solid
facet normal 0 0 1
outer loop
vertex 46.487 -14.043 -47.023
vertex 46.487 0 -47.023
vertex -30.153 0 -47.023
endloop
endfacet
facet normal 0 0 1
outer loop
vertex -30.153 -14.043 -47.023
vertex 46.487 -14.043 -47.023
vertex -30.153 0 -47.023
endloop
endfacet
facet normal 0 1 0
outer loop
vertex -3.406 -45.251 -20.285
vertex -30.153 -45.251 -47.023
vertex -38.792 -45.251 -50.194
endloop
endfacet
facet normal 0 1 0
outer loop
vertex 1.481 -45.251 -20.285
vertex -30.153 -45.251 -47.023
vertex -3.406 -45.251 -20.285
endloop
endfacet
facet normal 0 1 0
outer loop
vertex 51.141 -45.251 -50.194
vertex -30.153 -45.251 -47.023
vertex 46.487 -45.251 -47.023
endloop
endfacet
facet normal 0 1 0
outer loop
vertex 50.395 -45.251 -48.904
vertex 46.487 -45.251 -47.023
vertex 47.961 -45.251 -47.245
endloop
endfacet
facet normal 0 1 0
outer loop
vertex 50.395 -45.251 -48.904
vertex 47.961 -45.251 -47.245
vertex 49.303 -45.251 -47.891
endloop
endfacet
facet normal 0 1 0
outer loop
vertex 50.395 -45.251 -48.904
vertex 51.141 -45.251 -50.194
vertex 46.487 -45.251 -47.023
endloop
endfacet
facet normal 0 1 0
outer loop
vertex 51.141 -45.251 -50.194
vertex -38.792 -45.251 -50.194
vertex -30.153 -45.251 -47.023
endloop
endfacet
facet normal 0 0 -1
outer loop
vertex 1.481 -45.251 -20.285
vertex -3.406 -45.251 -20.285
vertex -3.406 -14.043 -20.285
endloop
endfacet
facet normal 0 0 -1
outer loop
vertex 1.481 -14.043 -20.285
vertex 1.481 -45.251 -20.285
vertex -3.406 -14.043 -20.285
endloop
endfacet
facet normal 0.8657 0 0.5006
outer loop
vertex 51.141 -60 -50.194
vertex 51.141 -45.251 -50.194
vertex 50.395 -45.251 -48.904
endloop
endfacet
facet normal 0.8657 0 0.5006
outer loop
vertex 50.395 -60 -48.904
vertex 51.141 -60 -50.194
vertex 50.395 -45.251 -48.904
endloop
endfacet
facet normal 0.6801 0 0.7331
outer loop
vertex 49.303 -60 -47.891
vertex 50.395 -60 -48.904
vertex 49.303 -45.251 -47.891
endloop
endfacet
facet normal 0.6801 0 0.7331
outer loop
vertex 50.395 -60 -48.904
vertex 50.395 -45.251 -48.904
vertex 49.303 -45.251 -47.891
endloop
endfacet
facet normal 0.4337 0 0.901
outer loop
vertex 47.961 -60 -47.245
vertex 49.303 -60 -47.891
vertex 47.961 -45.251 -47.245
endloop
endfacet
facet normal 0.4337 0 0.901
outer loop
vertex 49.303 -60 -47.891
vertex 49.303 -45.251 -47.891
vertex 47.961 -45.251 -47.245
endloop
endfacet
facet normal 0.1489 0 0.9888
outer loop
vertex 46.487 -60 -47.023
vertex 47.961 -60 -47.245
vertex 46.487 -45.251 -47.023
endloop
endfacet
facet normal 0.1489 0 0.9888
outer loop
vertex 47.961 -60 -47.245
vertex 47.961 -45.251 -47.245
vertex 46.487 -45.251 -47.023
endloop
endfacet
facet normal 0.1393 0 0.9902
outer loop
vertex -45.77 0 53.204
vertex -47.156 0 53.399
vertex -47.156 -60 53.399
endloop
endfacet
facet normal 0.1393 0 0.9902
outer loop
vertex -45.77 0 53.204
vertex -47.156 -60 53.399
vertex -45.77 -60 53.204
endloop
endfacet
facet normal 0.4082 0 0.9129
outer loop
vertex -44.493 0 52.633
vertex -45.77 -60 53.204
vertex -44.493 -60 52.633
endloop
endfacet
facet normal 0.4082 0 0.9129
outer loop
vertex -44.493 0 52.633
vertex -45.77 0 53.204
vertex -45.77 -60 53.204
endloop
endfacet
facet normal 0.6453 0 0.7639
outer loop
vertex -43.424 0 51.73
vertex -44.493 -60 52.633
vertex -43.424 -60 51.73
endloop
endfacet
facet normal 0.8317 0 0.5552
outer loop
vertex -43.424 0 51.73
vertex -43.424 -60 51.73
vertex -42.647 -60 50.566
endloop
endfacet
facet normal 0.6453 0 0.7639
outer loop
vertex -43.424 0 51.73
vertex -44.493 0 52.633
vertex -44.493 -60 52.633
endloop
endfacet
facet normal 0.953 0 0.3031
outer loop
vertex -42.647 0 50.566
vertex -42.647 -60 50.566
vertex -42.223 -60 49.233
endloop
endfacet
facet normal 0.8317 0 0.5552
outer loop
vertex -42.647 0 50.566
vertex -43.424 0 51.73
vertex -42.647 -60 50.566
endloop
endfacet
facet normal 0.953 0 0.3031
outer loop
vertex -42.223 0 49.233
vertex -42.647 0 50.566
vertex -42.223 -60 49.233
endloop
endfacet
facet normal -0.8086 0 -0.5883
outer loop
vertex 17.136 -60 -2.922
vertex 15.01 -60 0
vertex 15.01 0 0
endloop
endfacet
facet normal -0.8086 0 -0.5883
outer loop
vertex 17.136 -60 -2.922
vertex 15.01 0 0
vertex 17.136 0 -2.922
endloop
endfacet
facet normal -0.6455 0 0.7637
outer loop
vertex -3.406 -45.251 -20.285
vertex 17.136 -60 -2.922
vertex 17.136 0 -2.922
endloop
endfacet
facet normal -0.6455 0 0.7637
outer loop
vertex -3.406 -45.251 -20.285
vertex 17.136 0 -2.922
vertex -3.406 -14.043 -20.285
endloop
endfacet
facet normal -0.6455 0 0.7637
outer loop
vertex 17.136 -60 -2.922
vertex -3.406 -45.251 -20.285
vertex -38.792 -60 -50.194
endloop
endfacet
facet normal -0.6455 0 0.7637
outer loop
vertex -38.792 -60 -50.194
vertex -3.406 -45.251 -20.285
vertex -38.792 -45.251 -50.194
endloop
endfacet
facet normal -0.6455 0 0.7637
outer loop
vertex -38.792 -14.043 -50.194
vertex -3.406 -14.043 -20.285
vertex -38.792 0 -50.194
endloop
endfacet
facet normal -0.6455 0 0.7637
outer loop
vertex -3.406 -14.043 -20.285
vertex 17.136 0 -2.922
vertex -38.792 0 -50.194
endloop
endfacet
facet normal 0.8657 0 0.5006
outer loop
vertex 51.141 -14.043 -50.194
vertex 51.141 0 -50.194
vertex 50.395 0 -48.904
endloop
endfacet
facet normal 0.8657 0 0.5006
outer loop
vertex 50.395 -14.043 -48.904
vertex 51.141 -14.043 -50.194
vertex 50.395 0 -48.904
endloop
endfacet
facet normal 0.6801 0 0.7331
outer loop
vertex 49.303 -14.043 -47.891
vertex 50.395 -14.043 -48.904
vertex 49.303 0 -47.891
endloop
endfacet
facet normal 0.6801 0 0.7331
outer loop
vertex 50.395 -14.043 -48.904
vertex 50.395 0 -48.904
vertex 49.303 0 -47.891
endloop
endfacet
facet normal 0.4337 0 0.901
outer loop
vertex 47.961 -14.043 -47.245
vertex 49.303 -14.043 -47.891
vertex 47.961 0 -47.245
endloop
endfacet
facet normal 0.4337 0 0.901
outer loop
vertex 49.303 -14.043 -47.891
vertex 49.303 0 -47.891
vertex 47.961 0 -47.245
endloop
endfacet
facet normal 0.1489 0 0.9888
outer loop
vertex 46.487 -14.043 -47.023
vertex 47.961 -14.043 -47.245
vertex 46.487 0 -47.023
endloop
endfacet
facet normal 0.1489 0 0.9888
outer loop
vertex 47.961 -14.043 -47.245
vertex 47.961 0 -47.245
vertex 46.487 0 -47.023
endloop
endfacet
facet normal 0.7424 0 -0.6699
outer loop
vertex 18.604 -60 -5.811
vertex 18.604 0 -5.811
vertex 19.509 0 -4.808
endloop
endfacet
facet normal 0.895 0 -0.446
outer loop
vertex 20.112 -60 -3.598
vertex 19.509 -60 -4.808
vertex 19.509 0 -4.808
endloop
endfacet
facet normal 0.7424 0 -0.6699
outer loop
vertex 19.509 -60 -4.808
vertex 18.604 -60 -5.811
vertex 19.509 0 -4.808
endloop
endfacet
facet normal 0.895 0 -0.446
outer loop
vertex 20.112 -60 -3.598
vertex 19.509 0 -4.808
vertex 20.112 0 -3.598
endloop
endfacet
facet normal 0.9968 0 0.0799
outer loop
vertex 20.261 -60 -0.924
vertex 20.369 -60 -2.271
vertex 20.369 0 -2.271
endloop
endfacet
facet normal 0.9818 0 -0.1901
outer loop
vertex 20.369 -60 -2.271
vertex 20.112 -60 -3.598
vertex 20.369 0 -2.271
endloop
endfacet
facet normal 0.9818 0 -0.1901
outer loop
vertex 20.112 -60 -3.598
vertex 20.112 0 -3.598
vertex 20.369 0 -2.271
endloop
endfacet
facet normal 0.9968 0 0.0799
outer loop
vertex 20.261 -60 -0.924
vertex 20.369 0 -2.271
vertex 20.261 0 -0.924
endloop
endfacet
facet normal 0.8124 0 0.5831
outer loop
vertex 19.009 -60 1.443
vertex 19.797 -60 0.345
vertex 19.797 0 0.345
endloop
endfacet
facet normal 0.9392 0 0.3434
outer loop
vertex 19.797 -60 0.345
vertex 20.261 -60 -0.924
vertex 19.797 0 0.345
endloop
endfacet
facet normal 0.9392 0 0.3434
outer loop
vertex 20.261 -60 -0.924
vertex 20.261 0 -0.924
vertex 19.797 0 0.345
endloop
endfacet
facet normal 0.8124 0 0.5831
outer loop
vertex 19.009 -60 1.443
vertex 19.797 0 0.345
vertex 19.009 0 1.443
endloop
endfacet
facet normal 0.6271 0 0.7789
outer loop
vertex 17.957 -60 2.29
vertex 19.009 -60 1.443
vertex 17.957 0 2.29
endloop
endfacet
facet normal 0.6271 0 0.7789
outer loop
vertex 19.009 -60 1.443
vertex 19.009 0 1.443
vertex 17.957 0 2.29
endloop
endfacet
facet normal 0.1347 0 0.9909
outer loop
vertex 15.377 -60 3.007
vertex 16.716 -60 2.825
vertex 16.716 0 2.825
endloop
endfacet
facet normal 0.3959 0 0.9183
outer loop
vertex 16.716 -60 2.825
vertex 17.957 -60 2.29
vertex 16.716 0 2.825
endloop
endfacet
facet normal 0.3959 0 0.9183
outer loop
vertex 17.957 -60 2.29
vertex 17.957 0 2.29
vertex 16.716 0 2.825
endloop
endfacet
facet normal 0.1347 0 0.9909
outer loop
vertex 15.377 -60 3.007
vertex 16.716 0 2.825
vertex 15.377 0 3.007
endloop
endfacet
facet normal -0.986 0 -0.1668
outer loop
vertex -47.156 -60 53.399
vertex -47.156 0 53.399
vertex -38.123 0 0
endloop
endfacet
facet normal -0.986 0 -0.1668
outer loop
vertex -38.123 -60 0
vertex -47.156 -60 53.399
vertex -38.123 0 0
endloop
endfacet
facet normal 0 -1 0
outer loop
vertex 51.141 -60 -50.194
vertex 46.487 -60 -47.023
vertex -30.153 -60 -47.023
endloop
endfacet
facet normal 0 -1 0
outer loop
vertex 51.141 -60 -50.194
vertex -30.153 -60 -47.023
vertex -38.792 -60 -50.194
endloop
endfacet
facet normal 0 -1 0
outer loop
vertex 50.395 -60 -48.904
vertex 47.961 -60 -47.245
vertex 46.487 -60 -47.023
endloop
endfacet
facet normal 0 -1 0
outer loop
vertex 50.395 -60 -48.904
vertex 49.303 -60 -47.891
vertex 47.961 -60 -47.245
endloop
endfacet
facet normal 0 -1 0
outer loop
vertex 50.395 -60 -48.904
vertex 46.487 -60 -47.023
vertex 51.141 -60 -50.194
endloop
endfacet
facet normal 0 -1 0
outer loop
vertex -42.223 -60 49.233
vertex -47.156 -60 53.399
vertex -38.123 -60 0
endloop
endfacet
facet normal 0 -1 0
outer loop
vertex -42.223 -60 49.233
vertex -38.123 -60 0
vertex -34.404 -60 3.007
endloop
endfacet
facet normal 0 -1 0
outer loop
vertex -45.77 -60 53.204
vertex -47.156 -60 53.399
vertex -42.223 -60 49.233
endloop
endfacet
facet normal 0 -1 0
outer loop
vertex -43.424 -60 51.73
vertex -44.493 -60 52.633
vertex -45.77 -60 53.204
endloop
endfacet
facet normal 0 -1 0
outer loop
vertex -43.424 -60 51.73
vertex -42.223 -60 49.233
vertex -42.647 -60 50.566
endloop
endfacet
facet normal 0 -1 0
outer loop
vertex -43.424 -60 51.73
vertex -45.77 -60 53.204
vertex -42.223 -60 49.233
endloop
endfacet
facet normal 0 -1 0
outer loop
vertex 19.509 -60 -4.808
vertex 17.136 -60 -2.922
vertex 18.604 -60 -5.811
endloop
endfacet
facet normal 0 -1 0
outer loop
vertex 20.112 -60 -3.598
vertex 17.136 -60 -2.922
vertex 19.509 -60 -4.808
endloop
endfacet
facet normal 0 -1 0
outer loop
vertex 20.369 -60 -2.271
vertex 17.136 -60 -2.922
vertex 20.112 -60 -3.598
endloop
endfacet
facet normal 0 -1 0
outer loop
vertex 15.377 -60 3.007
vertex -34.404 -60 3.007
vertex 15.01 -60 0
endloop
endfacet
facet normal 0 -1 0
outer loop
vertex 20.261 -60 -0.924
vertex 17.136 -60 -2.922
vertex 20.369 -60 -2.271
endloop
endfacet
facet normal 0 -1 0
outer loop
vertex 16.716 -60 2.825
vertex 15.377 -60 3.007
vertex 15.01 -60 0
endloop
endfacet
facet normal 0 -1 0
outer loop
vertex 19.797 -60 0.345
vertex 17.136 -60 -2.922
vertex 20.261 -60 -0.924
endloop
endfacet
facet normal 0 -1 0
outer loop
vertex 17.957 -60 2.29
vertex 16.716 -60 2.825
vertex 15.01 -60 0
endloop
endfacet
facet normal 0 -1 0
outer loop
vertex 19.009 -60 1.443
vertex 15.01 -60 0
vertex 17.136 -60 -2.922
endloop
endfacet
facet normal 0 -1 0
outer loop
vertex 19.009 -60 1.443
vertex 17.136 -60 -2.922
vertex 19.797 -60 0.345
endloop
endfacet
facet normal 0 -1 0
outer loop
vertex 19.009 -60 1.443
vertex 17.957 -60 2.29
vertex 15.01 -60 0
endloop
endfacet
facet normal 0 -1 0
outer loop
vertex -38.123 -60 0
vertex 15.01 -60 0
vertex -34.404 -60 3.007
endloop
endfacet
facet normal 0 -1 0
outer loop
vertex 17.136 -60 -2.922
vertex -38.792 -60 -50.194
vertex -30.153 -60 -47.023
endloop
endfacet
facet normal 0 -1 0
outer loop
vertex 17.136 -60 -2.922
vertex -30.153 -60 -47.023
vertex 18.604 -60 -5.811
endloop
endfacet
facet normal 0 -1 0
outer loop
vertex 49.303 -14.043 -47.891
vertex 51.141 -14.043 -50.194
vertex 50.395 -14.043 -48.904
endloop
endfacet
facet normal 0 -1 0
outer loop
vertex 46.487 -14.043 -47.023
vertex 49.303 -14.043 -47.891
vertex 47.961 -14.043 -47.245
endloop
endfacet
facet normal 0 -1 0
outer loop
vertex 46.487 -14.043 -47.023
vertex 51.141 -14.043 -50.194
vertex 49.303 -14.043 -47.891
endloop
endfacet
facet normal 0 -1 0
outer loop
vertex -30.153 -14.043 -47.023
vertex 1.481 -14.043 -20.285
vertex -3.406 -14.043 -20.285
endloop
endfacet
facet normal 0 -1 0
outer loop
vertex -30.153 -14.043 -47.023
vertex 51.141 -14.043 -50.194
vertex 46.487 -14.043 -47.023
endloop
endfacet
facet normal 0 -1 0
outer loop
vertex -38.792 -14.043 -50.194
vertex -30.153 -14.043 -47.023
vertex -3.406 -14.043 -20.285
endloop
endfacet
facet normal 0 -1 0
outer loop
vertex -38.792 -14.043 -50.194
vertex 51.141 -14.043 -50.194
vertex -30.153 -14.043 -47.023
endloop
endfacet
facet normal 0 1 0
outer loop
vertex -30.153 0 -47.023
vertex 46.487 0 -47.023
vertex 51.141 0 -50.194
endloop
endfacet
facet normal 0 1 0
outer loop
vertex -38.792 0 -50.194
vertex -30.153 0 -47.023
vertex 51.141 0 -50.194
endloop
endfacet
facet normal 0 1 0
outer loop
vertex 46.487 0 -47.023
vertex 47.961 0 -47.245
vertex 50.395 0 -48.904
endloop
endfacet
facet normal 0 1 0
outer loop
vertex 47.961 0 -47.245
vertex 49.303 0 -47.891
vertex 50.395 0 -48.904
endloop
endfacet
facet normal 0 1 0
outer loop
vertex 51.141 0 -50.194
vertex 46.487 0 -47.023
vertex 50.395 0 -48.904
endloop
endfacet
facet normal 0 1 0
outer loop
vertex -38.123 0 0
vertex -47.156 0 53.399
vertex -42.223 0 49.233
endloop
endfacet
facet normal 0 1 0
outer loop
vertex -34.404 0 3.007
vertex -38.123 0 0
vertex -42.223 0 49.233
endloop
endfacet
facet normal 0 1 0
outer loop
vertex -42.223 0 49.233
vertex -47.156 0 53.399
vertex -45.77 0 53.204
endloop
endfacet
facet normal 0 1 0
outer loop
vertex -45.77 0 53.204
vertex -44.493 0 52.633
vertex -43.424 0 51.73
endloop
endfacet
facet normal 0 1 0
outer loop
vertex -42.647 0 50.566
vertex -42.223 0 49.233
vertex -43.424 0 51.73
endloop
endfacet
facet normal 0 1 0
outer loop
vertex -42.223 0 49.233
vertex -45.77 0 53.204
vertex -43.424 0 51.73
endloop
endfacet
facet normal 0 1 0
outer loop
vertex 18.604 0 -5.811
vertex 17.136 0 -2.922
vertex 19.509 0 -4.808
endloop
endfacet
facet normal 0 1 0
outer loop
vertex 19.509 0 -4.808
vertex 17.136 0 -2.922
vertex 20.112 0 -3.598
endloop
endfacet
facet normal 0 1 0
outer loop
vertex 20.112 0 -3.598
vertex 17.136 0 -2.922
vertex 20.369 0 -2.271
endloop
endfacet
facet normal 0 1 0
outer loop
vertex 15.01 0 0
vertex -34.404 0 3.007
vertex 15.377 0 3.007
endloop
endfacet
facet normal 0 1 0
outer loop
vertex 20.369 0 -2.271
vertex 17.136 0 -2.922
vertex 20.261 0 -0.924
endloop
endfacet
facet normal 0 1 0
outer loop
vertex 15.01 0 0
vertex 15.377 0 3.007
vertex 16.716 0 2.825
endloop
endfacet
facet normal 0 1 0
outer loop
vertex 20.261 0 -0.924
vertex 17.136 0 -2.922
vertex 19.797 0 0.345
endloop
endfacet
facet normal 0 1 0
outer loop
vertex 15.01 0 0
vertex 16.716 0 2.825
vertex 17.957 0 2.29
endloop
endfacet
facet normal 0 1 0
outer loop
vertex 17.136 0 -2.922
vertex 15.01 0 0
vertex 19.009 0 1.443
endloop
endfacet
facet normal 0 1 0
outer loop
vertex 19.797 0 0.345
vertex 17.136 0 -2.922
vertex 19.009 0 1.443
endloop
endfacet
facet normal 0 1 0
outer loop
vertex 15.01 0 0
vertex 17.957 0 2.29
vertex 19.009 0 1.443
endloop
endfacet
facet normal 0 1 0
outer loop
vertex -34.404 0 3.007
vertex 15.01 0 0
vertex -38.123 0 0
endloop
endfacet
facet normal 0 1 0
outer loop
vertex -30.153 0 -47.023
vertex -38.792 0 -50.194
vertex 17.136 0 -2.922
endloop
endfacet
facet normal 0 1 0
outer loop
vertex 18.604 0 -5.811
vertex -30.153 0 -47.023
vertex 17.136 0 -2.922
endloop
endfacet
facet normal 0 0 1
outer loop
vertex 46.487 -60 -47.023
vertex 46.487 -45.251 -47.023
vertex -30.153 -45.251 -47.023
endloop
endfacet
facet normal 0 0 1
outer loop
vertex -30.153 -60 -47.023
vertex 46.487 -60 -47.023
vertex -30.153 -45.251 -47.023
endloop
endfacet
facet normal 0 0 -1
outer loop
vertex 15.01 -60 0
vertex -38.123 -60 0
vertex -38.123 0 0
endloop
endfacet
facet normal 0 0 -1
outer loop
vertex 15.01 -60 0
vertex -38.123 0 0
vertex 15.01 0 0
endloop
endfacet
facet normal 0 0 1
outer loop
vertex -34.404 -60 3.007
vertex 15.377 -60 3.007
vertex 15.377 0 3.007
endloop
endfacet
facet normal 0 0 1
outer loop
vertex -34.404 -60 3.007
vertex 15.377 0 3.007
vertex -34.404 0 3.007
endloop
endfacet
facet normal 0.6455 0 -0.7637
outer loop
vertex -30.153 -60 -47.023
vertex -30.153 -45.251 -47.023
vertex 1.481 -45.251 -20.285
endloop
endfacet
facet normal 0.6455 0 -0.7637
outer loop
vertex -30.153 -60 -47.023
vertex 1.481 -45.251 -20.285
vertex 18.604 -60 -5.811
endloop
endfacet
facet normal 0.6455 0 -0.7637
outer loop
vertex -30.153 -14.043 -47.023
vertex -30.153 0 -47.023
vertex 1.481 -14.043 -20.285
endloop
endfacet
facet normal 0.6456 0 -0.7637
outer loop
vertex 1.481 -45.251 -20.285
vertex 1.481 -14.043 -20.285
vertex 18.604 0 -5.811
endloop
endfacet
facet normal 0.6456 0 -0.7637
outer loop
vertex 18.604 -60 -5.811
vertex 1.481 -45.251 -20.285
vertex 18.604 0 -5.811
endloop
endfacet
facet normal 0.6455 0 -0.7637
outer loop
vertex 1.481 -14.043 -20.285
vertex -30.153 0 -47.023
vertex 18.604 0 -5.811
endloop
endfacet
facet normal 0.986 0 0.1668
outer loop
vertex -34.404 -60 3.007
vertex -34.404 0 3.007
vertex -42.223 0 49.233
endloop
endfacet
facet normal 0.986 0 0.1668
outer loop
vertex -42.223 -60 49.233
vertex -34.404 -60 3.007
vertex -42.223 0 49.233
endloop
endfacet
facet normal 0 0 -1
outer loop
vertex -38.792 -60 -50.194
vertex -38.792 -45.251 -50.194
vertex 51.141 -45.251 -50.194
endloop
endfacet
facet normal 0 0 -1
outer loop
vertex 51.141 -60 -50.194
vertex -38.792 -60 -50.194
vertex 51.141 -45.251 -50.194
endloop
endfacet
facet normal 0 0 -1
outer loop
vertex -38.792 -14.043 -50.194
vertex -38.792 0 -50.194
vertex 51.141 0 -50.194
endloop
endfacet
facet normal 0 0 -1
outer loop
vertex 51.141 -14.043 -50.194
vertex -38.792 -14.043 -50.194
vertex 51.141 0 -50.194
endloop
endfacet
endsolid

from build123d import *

# Parameters (mm, degrees)
F1_DEPTH      = 60
F2_T1_DEPTH   = 128.3050587773
F2_T3_DEPTH   = 87.2325127198
F2_T5_DEPTH   = 83.2679866238
F3_W          = 31.2075465918
F3_H          = 53.4305032343
F4_DEPTH      = 47.1568533609
F4_DEPTH_BACK = 100


# Not quite as in the source:
# - a fillet or chamfer that OpenCascade refuses, or shapes differently, is made with other operations: its cross-section is extruded or revolved along the edge and cut away or added


with BuildPart() as f1:
    # F0 (on Front) → F1 (new body)
    with BuildSketch(Plane.XZ):
        Polygon((-43.1315037153, 54.6031631236), (-47.1558533609, 53.3990226686), (-38.1231829524, 0), (15.0101743639, 0), (17.1355064958, -2.9223344754), (-27.4965111166, -40.6470149755), (-38.7919515192, -50.1943512397), (51.1408522725, -50.1943512397), (51.1408522725, -47.0230206847), (-30.1531795412, -47.0230206847), (19.4947316054, -5.0587160063), (29.0376522148, 3.0073238074), (-34.4038493931, 3.0073238074), align=None)
    extrude(amount=F1_DEPTH)

    # F2: fillet of radius 5 on 3 edges, made by hand

    # F2_s2 → F2_t1 (cut)
    with BuildSketch(Plane.XZ.offset(-34.1525293886)):
        with BuildLine():
            ThreePointArc((18.6043132835, -5.8113314716), (20.0720252356, -0.274141409), (15.3766404593, 3.0073238074))
            Line((15.3766404593, 3.0073238074), (29.0376522148, 3.0073238074))
            Line((29.0376522148, 3.0073238074), (18.6043132835, -5.8113314716))
        make_face()
    extrude(amount=F2_T1_DEPTH, mode=Mode.SUBTRACT)

    # F2_s4 → F2_t3 (cut)
    with BuildSketch(Plane.XZ.offset(-13.6162563599)):
        with BuildLine():
            ThreePointArc((-47.1558533609, 53.3990226686), (-43.9268794892, 52.21892637), (-42.2231091456, 49.2329481124))
            Line((-42.2231091456, 49.2329481124), (-43.1315037153, 54.6031631236))
            Line((-43.1315037153, 54.6031631236), (-47.1558533609, 53.3990226686))
        make_face()
    extrude(amount=F2_T3_DEPTH, mode=Mode.SUBTRACT)

    # F2_s6 → F2_t5 (cut)
    with BuildSketch(Plane.XZ.offset(-11.6339933119)):
        with BuildLine():
            ThreePointArc((51.1408522725, -50.1943512397), (49.3029833415, -47.8912324989), (46.4872549478, -47.0230206847))
            Line((46.4872549478, -47.0230206847), (51.1408522725, -47.0230206847))
            Line((51.1408522725, -47.0230206847), (51.1408522725, -50.1943512397))
        make_face()
    extrude(amount=F2_T5_DEPTH, mode=Mode.SUBTRACT)

    # F3 (on Right) → F4 (cut, two sides)
    with BuildSketch(Plane.YZ) as f4_sk:
        with Locations((-29.6471677721, -47.0001557842)):
            Rectangle(F3_W, F3_H)
    extrude(amount=-F4_DEPTH, mode=Mode.SUBTRACT)
    extrude(f4_sk.sketch, amount=F4_DEPTH_BACK, mode=Mode.SUBTRACT)


solid = f1.part
